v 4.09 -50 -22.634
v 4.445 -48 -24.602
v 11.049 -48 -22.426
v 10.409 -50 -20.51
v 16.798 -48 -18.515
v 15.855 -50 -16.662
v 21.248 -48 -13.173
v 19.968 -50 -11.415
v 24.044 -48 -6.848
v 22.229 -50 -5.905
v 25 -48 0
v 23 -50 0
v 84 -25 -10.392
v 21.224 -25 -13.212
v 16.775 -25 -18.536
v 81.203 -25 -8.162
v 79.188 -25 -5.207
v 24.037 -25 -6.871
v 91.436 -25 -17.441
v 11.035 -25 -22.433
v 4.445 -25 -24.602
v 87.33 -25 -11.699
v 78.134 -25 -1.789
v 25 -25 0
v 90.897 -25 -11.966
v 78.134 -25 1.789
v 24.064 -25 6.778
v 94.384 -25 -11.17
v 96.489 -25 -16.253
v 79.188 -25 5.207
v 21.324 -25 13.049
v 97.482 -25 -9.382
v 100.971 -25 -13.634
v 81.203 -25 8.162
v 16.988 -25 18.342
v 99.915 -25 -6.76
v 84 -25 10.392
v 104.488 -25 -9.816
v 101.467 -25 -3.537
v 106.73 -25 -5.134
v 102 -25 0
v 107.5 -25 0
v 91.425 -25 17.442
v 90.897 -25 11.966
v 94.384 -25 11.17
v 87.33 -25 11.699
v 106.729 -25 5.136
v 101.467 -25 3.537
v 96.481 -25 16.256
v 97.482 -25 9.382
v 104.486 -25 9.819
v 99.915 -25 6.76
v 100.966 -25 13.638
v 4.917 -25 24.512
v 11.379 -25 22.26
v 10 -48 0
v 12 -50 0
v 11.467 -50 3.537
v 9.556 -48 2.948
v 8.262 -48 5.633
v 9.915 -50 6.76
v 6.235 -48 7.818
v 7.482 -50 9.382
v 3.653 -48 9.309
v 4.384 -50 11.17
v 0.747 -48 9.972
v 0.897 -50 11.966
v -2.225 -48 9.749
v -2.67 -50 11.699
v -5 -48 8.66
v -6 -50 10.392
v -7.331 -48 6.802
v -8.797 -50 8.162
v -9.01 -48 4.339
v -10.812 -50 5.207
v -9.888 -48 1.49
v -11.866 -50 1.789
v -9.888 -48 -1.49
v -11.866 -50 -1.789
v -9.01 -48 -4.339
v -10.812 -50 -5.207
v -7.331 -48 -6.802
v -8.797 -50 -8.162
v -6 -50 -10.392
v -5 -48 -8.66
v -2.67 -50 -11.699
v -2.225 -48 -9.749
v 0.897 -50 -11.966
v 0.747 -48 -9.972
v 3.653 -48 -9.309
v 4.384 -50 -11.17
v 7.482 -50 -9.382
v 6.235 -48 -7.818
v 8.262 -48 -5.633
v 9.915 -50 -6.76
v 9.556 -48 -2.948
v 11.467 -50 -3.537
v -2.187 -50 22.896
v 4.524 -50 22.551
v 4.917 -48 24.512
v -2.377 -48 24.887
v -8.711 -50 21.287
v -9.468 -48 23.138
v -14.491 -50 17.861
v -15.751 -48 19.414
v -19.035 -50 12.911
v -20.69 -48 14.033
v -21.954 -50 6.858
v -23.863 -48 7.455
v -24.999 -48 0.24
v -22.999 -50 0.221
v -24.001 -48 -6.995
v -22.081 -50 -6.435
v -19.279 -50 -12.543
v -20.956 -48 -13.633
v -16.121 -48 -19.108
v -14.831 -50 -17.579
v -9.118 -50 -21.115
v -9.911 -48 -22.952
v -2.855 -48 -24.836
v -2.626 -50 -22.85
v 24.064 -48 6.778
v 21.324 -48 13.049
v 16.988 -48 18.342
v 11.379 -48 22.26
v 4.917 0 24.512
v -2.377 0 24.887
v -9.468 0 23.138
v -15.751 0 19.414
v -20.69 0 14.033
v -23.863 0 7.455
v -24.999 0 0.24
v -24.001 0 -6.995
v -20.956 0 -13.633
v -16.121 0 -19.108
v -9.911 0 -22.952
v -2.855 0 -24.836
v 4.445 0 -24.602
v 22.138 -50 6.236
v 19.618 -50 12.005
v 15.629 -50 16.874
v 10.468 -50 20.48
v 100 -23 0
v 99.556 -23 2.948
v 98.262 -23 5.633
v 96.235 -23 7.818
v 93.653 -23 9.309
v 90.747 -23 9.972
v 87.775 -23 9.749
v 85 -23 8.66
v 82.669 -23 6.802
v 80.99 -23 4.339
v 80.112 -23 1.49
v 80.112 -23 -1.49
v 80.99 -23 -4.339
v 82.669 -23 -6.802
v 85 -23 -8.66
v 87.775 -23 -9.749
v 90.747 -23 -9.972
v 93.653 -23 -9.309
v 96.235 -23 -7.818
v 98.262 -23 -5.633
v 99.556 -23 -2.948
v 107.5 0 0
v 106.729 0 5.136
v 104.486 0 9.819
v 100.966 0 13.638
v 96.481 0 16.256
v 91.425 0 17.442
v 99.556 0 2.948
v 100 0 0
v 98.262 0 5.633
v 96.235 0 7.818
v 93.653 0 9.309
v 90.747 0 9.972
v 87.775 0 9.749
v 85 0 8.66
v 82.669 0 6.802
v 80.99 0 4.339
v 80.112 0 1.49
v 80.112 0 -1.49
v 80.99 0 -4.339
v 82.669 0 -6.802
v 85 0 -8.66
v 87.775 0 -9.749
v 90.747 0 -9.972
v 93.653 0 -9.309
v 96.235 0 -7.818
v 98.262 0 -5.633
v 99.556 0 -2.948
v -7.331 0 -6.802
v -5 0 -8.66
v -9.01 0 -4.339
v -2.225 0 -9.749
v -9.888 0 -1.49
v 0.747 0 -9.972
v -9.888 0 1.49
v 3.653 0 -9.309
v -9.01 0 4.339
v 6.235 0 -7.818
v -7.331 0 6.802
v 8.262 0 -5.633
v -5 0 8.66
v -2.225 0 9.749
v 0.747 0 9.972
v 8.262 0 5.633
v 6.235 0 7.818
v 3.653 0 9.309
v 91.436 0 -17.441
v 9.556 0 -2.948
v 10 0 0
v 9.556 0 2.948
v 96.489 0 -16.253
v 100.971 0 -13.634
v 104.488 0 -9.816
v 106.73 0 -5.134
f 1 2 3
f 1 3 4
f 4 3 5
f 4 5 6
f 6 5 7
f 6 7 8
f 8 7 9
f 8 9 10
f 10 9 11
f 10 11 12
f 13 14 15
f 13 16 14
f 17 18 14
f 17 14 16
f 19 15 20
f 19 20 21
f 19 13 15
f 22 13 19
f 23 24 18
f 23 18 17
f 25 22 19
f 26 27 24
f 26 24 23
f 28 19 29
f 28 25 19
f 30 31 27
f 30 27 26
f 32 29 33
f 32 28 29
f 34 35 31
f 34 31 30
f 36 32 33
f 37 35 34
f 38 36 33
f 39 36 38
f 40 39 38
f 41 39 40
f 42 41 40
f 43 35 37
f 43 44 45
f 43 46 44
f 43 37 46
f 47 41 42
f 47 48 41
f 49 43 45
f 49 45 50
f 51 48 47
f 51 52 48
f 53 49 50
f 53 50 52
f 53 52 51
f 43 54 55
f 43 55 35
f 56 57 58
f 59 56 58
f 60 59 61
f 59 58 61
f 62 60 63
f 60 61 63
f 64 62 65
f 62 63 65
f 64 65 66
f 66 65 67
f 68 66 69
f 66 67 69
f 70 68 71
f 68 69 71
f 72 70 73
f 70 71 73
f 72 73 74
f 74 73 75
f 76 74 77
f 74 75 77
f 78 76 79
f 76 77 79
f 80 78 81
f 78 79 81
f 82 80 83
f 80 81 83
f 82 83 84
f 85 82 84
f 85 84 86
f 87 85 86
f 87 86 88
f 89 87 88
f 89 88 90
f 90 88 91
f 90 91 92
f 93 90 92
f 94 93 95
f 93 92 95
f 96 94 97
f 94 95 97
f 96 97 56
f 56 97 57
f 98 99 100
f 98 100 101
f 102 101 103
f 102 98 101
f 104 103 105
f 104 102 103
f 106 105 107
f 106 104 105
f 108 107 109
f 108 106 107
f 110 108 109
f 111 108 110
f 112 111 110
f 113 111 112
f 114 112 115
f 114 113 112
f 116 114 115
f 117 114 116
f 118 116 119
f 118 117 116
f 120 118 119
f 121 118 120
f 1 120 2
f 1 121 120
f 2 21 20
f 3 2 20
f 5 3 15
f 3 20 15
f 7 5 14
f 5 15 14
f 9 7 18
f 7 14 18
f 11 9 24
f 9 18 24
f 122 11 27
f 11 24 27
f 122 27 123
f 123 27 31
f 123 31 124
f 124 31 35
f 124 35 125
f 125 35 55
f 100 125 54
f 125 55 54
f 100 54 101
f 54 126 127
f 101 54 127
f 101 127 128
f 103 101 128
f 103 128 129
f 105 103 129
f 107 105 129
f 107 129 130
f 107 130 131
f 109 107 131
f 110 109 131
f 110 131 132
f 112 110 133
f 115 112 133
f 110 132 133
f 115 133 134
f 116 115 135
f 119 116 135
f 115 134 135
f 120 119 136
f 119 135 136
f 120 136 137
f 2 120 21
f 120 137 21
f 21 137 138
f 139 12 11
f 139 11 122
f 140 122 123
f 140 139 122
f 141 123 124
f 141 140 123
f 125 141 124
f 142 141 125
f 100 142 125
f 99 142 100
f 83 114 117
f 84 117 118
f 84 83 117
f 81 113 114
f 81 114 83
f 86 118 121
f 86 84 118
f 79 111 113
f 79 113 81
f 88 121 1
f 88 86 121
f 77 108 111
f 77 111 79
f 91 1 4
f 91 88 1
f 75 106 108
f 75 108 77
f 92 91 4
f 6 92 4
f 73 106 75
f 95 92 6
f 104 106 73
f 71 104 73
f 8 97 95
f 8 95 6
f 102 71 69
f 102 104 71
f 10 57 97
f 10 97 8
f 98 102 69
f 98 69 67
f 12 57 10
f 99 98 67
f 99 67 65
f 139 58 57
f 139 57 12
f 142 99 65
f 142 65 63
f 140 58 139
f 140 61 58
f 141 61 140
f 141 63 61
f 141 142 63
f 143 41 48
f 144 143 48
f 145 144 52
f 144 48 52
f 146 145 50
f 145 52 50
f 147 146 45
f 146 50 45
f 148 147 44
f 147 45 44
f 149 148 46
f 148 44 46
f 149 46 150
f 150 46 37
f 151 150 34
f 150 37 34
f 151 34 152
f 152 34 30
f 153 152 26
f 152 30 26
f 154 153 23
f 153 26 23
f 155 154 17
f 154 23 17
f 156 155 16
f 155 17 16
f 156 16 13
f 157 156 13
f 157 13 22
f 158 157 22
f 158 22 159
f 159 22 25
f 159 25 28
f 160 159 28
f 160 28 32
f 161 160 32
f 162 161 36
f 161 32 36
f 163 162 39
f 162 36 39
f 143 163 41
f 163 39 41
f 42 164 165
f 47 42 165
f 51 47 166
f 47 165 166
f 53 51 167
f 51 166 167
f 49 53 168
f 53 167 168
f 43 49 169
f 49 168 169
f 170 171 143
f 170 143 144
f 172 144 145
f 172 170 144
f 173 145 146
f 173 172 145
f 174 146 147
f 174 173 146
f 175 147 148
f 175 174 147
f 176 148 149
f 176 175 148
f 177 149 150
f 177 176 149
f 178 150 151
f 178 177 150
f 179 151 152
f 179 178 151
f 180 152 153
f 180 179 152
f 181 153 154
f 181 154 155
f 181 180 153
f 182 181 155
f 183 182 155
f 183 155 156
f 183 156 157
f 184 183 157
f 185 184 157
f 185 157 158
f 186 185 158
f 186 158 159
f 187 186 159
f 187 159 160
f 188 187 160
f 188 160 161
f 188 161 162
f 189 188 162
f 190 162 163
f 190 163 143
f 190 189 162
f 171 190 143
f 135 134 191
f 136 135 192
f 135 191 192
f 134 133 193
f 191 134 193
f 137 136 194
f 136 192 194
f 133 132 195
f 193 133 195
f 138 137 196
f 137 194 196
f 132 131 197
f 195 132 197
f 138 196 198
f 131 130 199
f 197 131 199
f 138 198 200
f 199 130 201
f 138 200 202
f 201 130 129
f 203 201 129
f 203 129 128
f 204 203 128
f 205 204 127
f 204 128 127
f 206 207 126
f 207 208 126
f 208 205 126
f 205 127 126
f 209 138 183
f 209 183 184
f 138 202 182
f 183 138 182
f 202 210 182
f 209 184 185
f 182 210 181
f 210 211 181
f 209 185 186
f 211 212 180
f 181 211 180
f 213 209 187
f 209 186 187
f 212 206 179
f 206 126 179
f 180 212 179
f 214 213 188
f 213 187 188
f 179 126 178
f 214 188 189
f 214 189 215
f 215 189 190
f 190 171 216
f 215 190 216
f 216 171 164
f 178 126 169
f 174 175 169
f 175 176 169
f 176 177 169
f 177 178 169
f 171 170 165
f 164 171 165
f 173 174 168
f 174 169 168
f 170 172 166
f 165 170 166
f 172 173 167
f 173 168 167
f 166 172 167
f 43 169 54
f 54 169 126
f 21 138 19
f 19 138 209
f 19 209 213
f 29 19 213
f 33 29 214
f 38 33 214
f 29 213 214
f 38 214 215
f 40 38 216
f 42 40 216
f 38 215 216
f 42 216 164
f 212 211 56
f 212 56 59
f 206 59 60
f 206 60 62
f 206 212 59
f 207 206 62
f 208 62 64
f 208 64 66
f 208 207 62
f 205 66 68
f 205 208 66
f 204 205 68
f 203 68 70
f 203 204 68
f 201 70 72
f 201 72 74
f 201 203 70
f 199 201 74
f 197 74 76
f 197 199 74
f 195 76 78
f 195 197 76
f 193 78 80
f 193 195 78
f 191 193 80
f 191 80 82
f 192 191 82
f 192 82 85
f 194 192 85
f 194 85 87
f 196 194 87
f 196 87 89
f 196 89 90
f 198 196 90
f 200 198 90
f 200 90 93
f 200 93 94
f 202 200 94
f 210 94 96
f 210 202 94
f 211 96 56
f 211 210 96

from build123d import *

# Parameters (mm, degrees)
F0_R     = 10
F1_DEPTH = 25
F2_DEPTH = 50
F3_SIZE  = 2


with BuildPart() as f1:
    # F0 (on Front) → F1 (new body)
    with BuildSketch(Plane.XZ):
        with BuildLine():
            ThreePointArc((107.5, 0), (102.8684682655, 11.8597017037), (91.4254257714, 17.4418508585))
            ThreePointArc((91.4254257714, 17.4418508585), (72.5000007528, -0.0051329802), (91.4356573743, -17.4410116651))
            ThreePointArc((91.4356573743, -17.4410116651), (102.8719463185, -11.8559267025), (107.5, 0))
        make_face()
        with Locations((90, 0)):
            Circle(F0_R, mode=Mode.SUBTRACT)
        with BuildLine():
            ThreePointArc((4.9169029747, 24.5117128153), (19.3380786839, 15.8442012363), (25, 0))
            ThreePointArc((25, 0), (19.185007985, -16.0292067369), (4.4451625108, -24.6016367393))
            Line((4.4451625108, -24.6016367393), (91.4356573743, -17.4410116651))
            ThreePointArc((91.4356573743, -17.4410116651), (72.5000007528, -0.0051329802), (91.4254257714, 17.4418508585))
            Line((91.4254257714, 17.4418508585), (4.9169029747, 24.5117128153))
        make_face()
        with BuildLine():
            ThreePointArc((4.4451625108, -24.6016367393), (19.185007985, -16.0292067369), (25, 0))
            ThreePointArc((25, 0), (19.3380786839, 15.8442012363), (4.9169029747, 24.5117128153))
            ThreePointArc((4.9169029747, 24.5117128153), (-24.9988468465, 0.2401173553), (4.4451625108, -24.6016367393))
        make_face()
        Circle(F0_R, mode=Mode.SUBTRACT)
    extrude(amount=F1_DEPTH)

    # F0 (on Front) → F2 (join)
    with BuildSketch(Plane.XZ):
        with BuildLine():
            ThreePointArc((4.4451625108, -24.6016367393), (19.185007985, -16.0292067369), (25, 0))
            ThreePointArc((25, 0), (19.3380786839, 15.8442012363), (4.9169029747, 24.5117128153))
            ThreePointArc((4.9169029747, 24.5117128153), (-24.9988468465, 0.2401173553), (4.4451625108, -24.6016367393))
        make_face()
        Circle(F0_R, mode=Mode.SUBTRACT)
    extrude(amount=F2_DEPTH)

    # F3
    f3_edges = [f1.edges().sort_by_distance(p)[0] for p in [
        (-10, -50, 0),
        (-4.445163, -50, 24.601637),
        (80, -25, 0),
    ]]
    chamfer(f3_edges, length=F3_SIZE)


solid = f1.part
